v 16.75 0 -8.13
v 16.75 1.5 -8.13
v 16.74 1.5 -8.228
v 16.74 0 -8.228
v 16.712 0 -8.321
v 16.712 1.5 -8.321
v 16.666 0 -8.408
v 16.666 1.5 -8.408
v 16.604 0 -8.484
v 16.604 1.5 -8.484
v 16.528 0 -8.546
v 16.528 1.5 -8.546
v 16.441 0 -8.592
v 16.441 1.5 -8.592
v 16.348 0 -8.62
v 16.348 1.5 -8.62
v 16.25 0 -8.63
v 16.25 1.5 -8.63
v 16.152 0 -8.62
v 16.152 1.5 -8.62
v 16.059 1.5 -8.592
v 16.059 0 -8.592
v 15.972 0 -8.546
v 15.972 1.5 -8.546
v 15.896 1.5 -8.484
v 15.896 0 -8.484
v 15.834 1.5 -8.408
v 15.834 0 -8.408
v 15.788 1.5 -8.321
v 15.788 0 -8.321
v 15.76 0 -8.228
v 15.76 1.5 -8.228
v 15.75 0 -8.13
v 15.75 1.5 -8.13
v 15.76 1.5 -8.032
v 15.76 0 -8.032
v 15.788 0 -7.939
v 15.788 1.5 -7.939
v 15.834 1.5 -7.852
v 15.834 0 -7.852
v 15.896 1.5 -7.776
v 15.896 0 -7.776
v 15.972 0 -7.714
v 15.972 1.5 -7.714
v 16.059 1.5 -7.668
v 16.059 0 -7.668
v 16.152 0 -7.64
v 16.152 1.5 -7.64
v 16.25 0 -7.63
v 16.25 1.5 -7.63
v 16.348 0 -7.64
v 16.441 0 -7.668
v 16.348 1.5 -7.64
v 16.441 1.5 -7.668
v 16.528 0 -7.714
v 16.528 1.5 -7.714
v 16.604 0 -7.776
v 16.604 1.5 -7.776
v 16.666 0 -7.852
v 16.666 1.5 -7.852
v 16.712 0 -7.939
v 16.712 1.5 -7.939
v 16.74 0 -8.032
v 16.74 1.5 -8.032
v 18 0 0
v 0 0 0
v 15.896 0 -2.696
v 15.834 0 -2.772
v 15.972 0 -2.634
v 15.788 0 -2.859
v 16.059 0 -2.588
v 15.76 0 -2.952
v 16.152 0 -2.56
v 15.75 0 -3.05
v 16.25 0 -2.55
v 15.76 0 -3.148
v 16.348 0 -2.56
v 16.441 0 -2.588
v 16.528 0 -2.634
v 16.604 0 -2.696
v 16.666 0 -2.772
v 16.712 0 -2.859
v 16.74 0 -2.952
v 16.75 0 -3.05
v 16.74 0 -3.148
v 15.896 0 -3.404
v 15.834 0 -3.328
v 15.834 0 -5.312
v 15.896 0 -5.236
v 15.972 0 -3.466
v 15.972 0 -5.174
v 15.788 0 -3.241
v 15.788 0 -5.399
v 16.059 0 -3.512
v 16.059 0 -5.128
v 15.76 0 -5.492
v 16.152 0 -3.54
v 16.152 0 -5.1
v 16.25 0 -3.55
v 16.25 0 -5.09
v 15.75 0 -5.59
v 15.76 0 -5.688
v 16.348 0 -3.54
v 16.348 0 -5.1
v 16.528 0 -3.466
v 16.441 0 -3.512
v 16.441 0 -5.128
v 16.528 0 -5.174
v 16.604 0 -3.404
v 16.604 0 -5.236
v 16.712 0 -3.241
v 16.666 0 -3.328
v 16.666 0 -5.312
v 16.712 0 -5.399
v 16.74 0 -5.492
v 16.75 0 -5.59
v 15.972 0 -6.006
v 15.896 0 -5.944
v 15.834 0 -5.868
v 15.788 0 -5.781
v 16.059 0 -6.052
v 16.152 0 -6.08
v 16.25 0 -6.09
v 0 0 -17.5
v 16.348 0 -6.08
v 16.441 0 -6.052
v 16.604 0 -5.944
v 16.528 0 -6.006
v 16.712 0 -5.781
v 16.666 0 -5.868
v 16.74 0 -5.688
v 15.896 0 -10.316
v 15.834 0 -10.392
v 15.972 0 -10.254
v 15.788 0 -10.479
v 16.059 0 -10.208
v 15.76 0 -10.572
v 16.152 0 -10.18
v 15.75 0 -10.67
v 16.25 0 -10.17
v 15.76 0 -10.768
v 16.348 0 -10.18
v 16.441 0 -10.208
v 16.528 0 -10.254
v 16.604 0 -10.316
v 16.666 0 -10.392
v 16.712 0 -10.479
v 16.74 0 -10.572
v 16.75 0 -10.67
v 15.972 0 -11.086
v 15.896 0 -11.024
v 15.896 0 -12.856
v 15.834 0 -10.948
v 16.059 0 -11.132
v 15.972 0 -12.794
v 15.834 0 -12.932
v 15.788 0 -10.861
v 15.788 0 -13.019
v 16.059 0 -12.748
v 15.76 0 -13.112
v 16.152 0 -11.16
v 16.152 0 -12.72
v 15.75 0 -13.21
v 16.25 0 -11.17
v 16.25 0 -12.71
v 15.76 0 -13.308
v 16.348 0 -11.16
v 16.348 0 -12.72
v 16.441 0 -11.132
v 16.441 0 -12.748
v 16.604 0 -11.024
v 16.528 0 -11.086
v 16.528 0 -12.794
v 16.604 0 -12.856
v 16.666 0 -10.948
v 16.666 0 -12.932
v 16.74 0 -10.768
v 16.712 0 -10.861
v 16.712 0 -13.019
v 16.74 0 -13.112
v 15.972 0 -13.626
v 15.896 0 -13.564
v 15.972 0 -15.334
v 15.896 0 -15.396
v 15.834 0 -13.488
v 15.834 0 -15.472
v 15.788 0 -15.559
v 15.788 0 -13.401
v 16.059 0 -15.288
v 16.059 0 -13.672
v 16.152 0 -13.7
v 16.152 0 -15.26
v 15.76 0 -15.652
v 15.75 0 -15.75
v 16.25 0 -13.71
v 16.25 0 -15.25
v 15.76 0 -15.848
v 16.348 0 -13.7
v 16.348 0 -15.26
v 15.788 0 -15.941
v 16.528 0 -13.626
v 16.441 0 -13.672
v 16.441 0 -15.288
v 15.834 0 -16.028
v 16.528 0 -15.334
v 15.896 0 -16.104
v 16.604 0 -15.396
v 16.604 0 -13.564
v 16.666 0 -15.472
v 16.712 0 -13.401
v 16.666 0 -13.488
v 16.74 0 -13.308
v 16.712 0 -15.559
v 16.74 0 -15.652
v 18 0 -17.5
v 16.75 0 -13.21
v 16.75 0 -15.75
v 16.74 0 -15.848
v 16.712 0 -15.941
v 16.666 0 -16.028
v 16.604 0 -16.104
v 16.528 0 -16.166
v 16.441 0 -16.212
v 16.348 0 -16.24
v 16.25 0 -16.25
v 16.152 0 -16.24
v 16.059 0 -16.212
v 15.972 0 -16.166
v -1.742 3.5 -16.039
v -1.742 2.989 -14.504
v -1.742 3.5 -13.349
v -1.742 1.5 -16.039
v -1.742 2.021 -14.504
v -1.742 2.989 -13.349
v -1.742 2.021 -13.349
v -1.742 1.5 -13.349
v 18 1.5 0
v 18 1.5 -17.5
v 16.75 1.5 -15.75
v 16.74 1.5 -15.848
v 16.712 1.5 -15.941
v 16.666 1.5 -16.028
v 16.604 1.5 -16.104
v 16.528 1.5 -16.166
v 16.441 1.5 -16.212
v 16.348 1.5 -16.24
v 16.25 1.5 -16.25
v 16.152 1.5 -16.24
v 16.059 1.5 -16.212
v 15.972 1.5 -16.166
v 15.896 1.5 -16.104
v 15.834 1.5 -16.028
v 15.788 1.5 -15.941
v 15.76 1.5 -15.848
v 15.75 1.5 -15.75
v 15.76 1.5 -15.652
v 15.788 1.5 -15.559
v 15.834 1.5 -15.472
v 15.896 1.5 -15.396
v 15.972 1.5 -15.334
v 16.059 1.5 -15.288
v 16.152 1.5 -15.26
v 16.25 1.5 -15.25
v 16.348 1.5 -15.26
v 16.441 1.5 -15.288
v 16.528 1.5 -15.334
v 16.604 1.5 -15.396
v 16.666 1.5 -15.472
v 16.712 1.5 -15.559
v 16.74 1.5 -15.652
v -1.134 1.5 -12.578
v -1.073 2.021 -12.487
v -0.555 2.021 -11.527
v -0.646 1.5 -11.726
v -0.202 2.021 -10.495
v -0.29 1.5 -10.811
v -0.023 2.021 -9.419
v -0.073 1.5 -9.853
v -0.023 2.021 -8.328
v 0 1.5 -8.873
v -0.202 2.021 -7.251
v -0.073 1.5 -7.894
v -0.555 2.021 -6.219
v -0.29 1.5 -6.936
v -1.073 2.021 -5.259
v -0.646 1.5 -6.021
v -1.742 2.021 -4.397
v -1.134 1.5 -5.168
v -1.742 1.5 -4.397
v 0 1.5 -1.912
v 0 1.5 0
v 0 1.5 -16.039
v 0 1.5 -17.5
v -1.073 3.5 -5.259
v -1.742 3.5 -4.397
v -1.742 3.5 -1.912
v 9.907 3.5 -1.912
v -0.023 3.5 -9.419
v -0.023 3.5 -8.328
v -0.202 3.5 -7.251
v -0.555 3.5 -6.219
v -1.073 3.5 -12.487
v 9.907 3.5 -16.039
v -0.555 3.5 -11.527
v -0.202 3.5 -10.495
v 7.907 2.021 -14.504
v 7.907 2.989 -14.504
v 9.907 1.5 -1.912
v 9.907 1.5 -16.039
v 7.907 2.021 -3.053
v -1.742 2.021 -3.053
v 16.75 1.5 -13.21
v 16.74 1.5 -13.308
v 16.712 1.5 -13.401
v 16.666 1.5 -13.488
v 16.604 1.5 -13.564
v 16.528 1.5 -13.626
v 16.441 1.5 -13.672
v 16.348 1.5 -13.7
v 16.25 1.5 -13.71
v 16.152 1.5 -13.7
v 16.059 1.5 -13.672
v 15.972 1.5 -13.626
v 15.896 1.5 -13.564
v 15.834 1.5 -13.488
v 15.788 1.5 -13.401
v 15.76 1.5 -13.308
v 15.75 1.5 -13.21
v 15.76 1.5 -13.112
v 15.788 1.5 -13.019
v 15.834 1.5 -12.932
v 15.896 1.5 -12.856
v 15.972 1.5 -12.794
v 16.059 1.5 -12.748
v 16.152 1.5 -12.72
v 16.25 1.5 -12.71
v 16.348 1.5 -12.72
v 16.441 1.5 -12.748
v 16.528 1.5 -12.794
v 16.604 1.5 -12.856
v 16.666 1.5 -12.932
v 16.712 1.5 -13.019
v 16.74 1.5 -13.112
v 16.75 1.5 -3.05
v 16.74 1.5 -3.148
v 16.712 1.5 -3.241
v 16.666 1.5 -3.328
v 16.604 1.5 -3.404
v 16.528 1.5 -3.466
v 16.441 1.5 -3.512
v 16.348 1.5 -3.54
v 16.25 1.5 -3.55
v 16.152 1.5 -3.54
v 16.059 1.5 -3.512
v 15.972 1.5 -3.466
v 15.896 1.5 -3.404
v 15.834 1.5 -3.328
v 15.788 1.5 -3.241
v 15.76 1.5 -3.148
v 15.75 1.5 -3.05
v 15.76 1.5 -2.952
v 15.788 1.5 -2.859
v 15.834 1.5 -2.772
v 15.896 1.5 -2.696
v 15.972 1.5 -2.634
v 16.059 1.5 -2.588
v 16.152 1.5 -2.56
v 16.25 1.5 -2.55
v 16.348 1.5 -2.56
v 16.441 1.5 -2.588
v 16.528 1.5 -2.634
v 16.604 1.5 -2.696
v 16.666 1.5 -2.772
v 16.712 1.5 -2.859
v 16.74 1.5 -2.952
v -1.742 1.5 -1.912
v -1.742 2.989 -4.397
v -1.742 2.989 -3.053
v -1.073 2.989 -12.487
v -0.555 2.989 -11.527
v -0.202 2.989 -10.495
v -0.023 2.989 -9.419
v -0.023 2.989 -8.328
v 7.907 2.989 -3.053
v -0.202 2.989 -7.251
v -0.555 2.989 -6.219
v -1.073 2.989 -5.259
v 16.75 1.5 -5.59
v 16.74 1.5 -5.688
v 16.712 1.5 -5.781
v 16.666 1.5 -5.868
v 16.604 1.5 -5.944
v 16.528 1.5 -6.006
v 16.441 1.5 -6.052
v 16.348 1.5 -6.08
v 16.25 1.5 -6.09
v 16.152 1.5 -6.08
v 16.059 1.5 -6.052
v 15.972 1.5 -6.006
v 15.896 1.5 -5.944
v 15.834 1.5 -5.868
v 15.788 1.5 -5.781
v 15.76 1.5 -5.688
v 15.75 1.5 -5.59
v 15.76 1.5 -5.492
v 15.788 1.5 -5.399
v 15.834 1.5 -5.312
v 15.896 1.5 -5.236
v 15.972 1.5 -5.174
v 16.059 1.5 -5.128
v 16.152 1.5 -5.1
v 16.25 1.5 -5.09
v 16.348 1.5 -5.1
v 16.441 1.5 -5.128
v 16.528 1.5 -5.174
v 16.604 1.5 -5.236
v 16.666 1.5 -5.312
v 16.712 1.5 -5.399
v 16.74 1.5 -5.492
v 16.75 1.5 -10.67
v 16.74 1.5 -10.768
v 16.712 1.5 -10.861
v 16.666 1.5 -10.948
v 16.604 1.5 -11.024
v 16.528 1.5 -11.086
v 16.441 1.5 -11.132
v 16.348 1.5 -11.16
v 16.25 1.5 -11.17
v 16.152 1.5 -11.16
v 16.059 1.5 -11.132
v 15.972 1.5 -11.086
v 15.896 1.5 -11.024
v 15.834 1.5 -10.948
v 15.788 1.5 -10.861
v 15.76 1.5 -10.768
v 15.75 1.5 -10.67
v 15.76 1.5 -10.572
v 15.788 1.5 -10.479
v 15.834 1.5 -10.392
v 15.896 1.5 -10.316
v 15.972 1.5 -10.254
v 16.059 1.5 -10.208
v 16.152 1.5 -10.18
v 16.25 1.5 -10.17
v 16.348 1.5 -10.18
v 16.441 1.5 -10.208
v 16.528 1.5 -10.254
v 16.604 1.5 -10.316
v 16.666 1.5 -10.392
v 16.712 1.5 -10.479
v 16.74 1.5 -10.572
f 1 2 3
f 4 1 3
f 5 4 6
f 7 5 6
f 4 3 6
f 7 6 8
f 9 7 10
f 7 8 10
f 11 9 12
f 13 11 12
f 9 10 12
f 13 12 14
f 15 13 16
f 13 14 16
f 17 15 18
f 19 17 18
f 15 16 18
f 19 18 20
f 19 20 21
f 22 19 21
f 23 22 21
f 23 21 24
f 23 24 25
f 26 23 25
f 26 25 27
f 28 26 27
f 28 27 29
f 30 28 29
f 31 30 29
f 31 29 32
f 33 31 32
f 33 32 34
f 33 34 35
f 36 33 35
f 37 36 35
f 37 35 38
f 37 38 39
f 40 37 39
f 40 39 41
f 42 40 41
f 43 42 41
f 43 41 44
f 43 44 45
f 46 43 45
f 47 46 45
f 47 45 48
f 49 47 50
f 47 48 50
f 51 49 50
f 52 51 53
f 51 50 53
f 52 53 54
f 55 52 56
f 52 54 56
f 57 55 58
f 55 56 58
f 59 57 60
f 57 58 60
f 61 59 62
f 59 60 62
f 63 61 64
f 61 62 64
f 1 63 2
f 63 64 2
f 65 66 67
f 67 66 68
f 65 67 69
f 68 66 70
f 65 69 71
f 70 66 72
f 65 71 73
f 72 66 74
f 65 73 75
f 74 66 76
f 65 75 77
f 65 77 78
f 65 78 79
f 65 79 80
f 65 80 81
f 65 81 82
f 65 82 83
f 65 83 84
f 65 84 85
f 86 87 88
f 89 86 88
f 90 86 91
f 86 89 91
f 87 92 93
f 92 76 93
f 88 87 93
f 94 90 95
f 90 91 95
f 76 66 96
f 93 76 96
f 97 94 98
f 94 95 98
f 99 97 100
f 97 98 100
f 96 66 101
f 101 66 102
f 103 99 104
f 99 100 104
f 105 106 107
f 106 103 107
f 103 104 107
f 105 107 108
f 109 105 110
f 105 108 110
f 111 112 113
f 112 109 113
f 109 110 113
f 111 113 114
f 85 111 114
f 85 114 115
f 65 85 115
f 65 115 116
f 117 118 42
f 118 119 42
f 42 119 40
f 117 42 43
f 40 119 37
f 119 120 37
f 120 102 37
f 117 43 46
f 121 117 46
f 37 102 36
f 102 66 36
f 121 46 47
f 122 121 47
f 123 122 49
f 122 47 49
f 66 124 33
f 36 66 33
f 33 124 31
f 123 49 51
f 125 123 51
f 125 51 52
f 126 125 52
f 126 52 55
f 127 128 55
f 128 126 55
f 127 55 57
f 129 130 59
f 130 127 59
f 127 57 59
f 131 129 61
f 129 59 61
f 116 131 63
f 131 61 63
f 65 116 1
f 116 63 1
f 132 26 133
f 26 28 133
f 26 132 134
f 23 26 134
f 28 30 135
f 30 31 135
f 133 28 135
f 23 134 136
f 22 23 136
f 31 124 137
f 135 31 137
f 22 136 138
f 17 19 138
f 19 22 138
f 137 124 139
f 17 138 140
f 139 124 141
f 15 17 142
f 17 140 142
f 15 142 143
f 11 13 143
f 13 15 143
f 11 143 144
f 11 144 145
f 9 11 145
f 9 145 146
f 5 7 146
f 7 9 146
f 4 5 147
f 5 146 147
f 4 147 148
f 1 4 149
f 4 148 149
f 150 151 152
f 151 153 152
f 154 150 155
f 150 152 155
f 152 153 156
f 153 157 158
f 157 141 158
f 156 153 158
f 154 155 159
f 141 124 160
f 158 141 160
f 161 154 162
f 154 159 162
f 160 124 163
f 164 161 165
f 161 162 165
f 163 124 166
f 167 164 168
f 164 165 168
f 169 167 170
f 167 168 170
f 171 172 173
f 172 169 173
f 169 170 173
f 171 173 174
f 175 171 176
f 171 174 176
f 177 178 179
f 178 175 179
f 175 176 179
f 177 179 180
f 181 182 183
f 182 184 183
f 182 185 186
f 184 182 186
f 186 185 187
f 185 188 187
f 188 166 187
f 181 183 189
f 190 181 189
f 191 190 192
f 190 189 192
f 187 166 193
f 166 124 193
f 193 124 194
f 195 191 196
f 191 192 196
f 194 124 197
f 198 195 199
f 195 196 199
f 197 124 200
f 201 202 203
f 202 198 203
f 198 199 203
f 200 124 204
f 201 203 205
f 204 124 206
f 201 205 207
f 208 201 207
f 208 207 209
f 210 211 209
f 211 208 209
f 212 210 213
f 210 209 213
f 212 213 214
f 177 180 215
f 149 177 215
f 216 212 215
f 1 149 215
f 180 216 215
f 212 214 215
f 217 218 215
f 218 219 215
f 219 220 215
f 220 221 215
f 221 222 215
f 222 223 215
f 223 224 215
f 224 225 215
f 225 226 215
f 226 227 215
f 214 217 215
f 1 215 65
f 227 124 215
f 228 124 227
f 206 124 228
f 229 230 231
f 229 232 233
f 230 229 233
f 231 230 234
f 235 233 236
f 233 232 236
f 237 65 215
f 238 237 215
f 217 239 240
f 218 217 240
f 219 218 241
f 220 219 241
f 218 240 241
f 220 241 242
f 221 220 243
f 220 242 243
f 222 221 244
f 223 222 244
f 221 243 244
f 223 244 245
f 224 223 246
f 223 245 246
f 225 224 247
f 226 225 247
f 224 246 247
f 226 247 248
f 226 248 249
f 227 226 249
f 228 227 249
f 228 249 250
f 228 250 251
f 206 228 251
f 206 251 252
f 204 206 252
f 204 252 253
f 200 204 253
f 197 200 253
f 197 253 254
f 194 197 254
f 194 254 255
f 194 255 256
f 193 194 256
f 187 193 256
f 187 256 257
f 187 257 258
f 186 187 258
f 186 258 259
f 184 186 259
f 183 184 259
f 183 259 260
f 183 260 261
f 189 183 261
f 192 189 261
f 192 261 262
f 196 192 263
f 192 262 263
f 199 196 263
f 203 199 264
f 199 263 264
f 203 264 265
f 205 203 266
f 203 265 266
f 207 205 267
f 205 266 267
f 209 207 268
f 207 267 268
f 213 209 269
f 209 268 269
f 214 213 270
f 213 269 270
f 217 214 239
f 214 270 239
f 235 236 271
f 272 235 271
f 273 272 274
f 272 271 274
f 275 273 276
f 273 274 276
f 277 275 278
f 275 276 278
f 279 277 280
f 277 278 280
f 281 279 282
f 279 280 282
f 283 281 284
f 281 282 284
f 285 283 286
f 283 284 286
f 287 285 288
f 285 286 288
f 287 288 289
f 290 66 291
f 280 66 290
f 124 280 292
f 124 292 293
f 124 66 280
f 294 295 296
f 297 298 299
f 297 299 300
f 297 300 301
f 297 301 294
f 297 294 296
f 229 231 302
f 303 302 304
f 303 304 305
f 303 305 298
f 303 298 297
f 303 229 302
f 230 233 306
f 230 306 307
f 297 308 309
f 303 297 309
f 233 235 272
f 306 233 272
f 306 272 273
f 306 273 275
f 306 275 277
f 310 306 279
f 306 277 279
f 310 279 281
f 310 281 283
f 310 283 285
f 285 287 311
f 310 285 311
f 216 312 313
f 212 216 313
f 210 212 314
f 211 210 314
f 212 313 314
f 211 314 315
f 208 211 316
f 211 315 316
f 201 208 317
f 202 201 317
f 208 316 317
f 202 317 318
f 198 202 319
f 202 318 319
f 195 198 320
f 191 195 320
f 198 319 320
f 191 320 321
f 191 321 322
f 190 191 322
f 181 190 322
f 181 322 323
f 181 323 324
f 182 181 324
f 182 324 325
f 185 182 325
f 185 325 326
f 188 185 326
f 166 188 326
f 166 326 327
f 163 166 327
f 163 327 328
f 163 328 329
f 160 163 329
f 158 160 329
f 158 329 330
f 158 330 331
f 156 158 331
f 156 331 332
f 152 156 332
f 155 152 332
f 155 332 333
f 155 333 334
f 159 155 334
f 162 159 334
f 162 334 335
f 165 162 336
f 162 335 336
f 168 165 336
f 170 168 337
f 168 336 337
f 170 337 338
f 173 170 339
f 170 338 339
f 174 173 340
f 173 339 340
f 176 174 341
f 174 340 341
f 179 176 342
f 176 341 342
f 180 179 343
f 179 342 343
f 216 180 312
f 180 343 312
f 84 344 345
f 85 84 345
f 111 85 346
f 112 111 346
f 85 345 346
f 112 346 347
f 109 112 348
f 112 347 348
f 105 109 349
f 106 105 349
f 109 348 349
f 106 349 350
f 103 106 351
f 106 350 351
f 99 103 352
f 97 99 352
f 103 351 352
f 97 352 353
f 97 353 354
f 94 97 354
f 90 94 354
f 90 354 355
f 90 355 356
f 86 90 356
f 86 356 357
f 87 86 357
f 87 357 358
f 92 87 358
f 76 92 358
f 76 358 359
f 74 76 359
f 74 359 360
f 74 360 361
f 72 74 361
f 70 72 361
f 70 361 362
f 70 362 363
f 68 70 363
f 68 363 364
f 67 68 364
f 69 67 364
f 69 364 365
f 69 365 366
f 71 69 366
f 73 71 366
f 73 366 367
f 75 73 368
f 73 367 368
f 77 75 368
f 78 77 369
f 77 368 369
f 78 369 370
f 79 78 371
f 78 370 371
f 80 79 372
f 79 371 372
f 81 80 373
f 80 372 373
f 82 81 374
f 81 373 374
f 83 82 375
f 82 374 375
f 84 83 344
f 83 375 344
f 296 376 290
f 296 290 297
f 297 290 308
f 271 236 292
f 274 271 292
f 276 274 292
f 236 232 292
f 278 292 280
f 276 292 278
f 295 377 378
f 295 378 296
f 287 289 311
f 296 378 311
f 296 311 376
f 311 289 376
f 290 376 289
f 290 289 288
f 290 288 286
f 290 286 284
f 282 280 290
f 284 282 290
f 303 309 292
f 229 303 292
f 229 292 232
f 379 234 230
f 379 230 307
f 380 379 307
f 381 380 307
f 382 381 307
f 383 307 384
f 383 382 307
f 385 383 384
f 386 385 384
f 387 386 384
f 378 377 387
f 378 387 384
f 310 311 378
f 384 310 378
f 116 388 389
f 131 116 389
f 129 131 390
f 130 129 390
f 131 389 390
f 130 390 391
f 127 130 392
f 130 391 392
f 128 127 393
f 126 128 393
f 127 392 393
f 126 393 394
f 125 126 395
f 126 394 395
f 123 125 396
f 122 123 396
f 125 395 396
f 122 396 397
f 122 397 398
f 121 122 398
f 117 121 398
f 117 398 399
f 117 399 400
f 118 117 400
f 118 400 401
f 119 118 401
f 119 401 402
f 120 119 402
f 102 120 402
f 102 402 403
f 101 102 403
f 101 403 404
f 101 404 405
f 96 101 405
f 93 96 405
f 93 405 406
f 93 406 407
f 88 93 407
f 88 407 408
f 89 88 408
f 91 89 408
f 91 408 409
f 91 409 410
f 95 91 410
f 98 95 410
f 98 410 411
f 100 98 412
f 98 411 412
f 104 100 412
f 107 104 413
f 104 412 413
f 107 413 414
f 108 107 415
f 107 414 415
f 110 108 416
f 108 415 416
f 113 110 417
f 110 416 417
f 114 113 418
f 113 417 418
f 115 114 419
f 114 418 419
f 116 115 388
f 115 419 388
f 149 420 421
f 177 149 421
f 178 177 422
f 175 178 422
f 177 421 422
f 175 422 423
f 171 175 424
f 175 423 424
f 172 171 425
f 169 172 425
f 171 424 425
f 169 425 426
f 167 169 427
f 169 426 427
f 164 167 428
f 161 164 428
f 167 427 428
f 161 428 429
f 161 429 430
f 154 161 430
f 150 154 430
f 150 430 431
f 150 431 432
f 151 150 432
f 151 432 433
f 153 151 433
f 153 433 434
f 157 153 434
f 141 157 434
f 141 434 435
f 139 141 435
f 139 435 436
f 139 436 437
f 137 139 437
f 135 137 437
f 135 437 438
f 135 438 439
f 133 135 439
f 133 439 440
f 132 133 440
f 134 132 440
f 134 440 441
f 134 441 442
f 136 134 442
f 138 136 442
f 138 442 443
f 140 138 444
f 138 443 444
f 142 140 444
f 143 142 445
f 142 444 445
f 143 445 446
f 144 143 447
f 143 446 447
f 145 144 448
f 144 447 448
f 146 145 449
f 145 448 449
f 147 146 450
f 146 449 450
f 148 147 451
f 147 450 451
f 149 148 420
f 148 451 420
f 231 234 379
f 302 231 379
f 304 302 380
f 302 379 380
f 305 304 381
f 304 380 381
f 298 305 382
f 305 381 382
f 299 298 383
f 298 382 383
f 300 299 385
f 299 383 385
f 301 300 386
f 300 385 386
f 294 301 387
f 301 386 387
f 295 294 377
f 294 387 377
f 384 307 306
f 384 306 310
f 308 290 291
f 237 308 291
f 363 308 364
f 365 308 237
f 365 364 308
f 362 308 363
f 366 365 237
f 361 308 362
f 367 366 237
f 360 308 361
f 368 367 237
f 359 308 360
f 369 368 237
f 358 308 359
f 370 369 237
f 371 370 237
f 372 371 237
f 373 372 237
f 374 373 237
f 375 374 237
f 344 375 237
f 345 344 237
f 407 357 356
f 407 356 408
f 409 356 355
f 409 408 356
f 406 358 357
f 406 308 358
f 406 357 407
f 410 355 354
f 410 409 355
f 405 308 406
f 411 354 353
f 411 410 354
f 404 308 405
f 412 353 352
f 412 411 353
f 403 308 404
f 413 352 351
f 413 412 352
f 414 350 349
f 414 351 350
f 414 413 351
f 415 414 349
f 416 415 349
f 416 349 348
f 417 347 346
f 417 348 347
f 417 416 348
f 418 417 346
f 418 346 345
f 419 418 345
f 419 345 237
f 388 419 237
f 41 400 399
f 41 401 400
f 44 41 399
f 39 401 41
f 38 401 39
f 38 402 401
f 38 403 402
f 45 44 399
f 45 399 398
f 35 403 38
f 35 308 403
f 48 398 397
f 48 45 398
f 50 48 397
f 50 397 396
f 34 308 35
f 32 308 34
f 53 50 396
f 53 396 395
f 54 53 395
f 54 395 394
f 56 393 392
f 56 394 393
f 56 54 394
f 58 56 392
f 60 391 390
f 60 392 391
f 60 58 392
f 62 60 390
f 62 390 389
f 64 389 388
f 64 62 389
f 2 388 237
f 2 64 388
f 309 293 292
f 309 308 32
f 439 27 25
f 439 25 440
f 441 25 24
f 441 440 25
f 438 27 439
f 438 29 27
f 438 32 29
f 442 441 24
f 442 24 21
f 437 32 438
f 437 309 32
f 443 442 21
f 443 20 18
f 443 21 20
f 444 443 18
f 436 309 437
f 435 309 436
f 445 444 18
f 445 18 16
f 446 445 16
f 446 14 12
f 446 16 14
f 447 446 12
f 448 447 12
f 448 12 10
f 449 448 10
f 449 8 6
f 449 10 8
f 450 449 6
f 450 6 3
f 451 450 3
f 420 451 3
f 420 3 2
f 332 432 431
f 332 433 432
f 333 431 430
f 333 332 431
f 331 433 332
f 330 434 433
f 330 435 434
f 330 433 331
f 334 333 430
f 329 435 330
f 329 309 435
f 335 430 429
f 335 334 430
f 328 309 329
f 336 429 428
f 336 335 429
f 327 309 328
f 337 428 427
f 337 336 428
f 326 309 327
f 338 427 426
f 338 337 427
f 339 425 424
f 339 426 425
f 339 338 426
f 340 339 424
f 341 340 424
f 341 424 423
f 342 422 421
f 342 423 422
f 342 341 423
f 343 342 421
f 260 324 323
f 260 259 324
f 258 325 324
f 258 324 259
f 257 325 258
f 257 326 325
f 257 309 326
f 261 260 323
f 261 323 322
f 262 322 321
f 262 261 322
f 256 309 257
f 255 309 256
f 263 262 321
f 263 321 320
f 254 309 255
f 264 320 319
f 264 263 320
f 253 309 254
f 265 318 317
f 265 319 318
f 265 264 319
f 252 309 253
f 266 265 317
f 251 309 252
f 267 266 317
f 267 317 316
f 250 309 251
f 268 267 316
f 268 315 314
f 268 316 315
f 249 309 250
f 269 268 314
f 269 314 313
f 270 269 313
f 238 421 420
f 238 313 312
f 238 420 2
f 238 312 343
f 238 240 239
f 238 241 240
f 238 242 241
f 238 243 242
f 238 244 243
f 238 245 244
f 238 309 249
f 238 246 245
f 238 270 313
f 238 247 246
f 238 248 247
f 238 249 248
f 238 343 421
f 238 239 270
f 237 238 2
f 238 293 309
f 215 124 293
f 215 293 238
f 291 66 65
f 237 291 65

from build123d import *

# Parameters (mm, degrees)
SKETCH1_W           = 18
SKETCH1_H           = 17.5
BOSS_EXTRUDE1_DEPTH = 1.5
BOSS_EXTRUDE2_DEPTH = 2
SKETCH3_R           = 0.5
CUT_EXTRUDE1_DEPTH  = 2.5
SKETCH4_W           = 11.451958773
SKETCH4_H           = 0.968573627
CUT_EXTRUDE2_DEPTH  = 9.649638


with BuildPart() as part:
    # Sketch1 → Boss-Extrude1 (new body)
    with BuildSketch(Plane(origin=(0, 0, 0), x_dir=(1, 0, 0), z_dir=(0, 1, 0))):
        with Locations((9, 8.75)):
            Rectangle(SKETCH1_W, SKETCH1_H)
    extrude(amount=BOSS_EXTRUDE1_DEPTH)

    # Sketch2 → Boss-Extrude2 (add)
    with BuildSketch(Plane(origin=(0, 1.5, 0), x_dir=(1, 0, 0), z_dir=(0, 1, 0))):
        with BuildLine():
            Line((-1.742375604, 4.397064227), (-1.742375604, 1.912224032))
            Line((-1.742375604, 1.912224032), (9.907262148, 1.912224032))
            Line((9.907262148, 1.912224032), (9.907262148, 16.039286602))
            Line((9.907262148, 16.039286602), (-1.742375604, 16.039286602))
            Line((-1.742375604, 16.039286602), (-1.742375604, 13.34923012))
            ThreePointArc((-1.742375604, 13.34923012), (0, 8.873147173), (-1.742375604, 4.397064227))
        make_face()
    extrude(amount=BOSS_EXTRUDE2_DEPTH)

    # Sketch3 → Cut-Extrude1 (cut, through all)
    with BuildSketch(Plane(origin=(0, 1.5, 0), x_dir=(1, 0, 0), z_dir=(0, 1, 0))):
        with Locations((16.25, 15.75)):
            Circle(SKETCH3_R)
        with Locations((16.25, 13.21)):
            Circle(SKETCH3_R)
        with Locations((16.25, 10.67)):
            Circle(SKETCH3_R)
        with Locations((16.25, 8.13)):
            Circle(SKETCH3_R)
        with Locations((16.25, 5.59)):
            Circle(SKETCH3_R)
        with Locations((16.25, 3.05)):
            Circle(SKETCH3_R)
    extrude(amount=-CUT_EXTRUDE1_DEPTH, mode=Mode.SUBTRACT)

    # Sketch4 → Cut-Extrude2 (cut)
    with BuildSketch(Plane.ZY.offset(1.742375604)):
        with Locations((-8.77848746, 2.504917681)):
            Rectangle(SKETCH4_W, SKETCH4_H)
    extrude(amount=-CUT_EXTRUDE2_DEPTH, mode=Mode.SUBTRACT)


solid = part.part
